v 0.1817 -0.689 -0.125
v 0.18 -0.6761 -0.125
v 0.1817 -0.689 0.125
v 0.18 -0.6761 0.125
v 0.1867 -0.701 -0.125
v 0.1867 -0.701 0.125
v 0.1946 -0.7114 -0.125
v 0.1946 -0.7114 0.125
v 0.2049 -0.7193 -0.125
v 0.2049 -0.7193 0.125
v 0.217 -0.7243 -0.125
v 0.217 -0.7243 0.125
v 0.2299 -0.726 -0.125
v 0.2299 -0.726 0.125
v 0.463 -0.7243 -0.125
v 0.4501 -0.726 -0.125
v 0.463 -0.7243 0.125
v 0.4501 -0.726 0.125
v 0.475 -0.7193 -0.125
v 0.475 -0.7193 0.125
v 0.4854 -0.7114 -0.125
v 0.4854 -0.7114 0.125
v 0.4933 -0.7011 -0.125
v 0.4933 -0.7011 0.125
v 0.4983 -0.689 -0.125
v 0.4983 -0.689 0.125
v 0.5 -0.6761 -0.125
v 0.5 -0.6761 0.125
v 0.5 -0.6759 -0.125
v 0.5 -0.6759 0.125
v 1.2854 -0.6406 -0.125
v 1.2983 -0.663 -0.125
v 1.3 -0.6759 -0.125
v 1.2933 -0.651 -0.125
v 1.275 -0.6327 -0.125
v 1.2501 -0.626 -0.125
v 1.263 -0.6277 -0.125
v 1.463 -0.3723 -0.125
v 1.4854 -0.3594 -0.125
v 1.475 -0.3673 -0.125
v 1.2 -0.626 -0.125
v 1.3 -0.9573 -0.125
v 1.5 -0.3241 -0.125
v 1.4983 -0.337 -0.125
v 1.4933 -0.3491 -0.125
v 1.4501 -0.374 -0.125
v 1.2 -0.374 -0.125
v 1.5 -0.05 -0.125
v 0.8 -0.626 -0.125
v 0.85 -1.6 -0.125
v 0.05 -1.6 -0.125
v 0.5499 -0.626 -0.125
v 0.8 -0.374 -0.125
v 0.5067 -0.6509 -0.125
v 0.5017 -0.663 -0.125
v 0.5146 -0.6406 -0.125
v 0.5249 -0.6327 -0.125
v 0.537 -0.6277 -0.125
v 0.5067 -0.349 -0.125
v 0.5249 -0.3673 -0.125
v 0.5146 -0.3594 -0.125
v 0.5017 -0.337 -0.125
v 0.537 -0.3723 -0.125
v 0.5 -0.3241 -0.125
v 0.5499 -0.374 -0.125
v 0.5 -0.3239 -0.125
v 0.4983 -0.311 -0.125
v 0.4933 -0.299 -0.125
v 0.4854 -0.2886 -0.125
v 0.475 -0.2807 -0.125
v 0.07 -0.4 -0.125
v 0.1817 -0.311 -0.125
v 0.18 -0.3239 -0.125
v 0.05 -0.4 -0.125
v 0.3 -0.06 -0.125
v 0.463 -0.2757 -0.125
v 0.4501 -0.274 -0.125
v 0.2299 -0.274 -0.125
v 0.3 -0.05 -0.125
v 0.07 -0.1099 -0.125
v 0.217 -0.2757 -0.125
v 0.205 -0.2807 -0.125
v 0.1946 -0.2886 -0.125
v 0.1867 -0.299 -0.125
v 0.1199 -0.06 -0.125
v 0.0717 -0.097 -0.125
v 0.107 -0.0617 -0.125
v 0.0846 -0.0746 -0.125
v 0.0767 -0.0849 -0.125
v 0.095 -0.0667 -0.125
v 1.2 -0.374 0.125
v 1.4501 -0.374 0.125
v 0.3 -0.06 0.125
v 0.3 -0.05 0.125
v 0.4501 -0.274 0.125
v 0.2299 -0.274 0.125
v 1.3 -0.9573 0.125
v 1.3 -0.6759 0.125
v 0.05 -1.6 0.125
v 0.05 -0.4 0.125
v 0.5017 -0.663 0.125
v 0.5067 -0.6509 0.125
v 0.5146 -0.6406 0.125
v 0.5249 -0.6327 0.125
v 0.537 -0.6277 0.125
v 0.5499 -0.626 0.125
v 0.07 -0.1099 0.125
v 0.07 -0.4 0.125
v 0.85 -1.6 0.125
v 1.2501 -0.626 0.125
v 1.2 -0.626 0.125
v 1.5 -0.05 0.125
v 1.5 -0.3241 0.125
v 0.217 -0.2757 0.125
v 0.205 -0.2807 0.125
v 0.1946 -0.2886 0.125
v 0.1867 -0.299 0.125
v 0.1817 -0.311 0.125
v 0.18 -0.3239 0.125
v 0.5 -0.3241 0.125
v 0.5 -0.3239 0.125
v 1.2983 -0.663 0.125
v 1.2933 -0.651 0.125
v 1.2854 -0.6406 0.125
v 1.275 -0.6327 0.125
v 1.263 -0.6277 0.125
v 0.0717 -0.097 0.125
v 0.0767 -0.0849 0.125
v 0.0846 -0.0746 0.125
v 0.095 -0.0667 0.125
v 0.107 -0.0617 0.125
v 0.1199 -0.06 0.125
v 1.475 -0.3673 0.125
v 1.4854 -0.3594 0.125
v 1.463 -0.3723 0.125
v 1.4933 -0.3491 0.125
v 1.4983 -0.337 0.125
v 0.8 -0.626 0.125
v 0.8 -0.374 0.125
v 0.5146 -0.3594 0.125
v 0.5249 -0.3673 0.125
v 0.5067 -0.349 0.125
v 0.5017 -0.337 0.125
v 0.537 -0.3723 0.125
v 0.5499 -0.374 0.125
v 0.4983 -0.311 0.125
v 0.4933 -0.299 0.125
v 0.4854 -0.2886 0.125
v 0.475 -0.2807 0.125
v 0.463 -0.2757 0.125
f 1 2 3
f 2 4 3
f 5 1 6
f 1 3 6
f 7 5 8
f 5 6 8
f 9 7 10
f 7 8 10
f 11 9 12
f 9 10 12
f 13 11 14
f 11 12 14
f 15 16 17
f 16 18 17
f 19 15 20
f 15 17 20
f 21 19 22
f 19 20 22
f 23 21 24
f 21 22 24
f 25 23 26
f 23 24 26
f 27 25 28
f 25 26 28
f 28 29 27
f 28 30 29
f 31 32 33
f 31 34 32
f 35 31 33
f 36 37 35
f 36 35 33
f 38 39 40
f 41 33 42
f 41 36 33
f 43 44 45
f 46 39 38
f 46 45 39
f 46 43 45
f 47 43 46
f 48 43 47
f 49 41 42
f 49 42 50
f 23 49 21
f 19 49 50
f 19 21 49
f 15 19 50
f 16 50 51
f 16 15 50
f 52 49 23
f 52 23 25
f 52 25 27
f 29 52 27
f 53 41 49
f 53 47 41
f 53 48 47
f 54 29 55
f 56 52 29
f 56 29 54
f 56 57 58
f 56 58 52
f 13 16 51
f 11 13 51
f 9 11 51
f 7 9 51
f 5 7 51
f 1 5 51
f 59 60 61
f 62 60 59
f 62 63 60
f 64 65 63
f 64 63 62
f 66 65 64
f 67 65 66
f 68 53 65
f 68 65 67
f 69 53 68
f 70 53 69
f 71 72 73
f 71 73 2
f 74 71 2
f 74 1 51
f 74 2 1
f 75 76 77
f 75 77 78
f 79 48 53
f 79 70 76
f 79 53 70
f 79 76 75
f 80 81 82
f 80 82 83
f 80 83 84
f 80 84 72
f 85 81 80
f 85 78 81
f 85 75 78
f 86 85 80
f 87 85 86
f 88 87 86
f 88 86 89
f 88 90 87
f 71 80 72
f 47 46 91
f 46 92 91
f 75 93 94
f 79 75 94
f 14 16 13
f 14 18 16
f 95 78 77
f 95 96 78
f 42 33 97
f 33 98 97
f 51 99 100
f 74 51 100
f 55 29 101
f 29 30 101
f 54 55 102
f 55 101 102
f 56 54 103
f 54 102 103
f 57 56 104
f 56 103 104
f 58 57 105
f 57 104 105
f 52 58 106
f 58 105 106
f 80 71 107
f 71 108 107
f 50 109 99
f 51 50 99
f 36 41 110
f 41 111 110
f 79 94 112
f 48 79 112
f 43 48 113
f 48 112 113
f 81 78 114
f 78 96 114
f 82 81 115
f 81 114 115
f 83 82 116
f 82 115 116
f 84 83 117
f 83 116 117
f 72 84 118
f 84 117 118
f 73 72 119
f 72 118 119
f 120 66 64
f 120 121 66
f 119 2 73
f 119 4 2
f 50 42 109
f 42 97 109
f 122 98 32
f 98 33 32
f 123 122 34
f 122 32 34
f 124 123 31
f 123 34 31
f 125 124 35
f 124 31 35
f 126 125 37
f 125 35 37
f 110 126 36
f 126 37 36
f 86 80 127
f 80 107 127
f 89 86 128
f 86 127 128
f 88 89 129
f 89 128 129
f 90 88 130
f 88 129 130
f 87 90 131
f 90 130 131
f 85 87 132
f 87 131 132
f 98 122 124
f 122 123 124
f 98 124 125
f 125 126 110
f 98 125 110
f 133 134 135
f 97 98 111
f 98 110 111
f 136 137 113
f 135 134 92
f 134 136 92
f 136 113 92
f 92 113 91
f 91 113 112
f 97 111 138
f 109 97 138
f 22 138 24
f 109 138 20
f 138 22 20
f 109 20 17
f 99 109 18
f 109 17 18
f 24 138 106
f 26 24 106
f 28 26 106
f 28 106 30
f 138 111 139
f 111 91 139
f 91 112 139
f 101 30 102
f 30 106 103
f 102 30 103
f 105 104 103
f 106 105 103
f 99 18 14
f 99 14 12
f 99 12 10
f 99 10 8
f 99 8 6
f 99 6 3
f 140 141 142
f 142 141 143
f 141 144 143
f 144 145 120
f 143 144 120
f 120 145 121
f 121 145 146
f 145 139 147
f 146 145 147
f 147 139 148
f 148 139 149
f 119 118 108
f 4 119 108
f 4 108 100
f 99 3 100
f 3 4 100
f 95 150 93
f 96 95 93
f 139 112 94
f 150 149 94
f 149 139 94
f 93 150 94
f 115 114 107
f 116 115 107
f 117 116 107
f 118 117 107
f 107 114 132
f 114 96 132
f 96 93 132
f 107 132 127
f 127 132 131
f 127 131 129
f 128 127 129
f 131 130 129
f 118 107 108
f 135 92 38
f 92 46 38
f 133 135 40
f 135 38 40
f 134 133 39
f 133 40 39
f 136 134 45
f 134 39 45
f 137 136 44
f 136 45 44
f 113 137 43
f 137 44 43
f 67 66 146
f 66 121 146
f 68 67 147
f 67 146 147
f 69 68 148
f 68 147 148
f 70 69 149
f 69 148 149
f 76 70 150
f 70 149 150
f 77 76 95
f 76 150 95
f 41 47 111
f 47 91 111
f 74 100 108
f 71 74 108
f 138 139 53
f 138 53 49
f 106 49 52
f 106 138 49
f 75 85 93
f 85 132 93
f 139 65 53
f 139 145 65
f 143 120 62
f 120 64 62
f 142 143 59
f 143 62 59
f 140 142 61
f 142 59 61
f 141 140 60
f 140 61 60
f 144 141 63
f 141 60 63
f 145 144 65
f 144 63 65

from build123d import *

# Parameters (mm, degrees)
BOSS_EXTRUDE1_DEPTH = 0.125
FILLET1_R           = 0.05


with BuildPart() as part:
    # frame_outline → Boss-Extrude1 (new, symmetric)
    with BuildSketch(Plane.XY):
        Polygon((0.3, -0.05), (1.5, -0.05), (1.5, -0.374), (1.2, -0.374), (1.2, -0.626), (1.3, -0.626), (1.3, -0.957333397), (0.85, -1.6), (0.05, -1.6), (0.05, -0.4), (0.07, -0.4), (0.07, -0.06), (0.3, -0.06), align=None)
        Polygon((0.5, -0.374), (0.8, -0.374), (0.8, -0.626), (0.5, -0.626), (0.5, -0.726), (0.18, -0.726), (0.18, -0.274), (0.5, -0.274), align=None, mode=Mode.SUBTRACT)
    extrude(amount=BOSS_EXTRUDE1_DEPTH, both=True)

    # Fillet1
    fillet1_edges = [part.edges().sort_by_distance(p)[0] for p in [
        (1.3, -0.626, 0),
        (1.5, -0.374, 0),
        (0.5, -0.374, 0),
        (0.5, -0.626, 0),
        (0.5, -0.726, 0),
        (0.18, -0.726, 0),
        (0.5, -0.274, 0),
        (0.18, -0.274, 0),
        (0.07, -0.06, 0),
    ]]
    fillet(fillet1_edges, radius=FILLET1_R - 0.0001)  # a hair under: the kernel refuses the full size


solid = part.part
